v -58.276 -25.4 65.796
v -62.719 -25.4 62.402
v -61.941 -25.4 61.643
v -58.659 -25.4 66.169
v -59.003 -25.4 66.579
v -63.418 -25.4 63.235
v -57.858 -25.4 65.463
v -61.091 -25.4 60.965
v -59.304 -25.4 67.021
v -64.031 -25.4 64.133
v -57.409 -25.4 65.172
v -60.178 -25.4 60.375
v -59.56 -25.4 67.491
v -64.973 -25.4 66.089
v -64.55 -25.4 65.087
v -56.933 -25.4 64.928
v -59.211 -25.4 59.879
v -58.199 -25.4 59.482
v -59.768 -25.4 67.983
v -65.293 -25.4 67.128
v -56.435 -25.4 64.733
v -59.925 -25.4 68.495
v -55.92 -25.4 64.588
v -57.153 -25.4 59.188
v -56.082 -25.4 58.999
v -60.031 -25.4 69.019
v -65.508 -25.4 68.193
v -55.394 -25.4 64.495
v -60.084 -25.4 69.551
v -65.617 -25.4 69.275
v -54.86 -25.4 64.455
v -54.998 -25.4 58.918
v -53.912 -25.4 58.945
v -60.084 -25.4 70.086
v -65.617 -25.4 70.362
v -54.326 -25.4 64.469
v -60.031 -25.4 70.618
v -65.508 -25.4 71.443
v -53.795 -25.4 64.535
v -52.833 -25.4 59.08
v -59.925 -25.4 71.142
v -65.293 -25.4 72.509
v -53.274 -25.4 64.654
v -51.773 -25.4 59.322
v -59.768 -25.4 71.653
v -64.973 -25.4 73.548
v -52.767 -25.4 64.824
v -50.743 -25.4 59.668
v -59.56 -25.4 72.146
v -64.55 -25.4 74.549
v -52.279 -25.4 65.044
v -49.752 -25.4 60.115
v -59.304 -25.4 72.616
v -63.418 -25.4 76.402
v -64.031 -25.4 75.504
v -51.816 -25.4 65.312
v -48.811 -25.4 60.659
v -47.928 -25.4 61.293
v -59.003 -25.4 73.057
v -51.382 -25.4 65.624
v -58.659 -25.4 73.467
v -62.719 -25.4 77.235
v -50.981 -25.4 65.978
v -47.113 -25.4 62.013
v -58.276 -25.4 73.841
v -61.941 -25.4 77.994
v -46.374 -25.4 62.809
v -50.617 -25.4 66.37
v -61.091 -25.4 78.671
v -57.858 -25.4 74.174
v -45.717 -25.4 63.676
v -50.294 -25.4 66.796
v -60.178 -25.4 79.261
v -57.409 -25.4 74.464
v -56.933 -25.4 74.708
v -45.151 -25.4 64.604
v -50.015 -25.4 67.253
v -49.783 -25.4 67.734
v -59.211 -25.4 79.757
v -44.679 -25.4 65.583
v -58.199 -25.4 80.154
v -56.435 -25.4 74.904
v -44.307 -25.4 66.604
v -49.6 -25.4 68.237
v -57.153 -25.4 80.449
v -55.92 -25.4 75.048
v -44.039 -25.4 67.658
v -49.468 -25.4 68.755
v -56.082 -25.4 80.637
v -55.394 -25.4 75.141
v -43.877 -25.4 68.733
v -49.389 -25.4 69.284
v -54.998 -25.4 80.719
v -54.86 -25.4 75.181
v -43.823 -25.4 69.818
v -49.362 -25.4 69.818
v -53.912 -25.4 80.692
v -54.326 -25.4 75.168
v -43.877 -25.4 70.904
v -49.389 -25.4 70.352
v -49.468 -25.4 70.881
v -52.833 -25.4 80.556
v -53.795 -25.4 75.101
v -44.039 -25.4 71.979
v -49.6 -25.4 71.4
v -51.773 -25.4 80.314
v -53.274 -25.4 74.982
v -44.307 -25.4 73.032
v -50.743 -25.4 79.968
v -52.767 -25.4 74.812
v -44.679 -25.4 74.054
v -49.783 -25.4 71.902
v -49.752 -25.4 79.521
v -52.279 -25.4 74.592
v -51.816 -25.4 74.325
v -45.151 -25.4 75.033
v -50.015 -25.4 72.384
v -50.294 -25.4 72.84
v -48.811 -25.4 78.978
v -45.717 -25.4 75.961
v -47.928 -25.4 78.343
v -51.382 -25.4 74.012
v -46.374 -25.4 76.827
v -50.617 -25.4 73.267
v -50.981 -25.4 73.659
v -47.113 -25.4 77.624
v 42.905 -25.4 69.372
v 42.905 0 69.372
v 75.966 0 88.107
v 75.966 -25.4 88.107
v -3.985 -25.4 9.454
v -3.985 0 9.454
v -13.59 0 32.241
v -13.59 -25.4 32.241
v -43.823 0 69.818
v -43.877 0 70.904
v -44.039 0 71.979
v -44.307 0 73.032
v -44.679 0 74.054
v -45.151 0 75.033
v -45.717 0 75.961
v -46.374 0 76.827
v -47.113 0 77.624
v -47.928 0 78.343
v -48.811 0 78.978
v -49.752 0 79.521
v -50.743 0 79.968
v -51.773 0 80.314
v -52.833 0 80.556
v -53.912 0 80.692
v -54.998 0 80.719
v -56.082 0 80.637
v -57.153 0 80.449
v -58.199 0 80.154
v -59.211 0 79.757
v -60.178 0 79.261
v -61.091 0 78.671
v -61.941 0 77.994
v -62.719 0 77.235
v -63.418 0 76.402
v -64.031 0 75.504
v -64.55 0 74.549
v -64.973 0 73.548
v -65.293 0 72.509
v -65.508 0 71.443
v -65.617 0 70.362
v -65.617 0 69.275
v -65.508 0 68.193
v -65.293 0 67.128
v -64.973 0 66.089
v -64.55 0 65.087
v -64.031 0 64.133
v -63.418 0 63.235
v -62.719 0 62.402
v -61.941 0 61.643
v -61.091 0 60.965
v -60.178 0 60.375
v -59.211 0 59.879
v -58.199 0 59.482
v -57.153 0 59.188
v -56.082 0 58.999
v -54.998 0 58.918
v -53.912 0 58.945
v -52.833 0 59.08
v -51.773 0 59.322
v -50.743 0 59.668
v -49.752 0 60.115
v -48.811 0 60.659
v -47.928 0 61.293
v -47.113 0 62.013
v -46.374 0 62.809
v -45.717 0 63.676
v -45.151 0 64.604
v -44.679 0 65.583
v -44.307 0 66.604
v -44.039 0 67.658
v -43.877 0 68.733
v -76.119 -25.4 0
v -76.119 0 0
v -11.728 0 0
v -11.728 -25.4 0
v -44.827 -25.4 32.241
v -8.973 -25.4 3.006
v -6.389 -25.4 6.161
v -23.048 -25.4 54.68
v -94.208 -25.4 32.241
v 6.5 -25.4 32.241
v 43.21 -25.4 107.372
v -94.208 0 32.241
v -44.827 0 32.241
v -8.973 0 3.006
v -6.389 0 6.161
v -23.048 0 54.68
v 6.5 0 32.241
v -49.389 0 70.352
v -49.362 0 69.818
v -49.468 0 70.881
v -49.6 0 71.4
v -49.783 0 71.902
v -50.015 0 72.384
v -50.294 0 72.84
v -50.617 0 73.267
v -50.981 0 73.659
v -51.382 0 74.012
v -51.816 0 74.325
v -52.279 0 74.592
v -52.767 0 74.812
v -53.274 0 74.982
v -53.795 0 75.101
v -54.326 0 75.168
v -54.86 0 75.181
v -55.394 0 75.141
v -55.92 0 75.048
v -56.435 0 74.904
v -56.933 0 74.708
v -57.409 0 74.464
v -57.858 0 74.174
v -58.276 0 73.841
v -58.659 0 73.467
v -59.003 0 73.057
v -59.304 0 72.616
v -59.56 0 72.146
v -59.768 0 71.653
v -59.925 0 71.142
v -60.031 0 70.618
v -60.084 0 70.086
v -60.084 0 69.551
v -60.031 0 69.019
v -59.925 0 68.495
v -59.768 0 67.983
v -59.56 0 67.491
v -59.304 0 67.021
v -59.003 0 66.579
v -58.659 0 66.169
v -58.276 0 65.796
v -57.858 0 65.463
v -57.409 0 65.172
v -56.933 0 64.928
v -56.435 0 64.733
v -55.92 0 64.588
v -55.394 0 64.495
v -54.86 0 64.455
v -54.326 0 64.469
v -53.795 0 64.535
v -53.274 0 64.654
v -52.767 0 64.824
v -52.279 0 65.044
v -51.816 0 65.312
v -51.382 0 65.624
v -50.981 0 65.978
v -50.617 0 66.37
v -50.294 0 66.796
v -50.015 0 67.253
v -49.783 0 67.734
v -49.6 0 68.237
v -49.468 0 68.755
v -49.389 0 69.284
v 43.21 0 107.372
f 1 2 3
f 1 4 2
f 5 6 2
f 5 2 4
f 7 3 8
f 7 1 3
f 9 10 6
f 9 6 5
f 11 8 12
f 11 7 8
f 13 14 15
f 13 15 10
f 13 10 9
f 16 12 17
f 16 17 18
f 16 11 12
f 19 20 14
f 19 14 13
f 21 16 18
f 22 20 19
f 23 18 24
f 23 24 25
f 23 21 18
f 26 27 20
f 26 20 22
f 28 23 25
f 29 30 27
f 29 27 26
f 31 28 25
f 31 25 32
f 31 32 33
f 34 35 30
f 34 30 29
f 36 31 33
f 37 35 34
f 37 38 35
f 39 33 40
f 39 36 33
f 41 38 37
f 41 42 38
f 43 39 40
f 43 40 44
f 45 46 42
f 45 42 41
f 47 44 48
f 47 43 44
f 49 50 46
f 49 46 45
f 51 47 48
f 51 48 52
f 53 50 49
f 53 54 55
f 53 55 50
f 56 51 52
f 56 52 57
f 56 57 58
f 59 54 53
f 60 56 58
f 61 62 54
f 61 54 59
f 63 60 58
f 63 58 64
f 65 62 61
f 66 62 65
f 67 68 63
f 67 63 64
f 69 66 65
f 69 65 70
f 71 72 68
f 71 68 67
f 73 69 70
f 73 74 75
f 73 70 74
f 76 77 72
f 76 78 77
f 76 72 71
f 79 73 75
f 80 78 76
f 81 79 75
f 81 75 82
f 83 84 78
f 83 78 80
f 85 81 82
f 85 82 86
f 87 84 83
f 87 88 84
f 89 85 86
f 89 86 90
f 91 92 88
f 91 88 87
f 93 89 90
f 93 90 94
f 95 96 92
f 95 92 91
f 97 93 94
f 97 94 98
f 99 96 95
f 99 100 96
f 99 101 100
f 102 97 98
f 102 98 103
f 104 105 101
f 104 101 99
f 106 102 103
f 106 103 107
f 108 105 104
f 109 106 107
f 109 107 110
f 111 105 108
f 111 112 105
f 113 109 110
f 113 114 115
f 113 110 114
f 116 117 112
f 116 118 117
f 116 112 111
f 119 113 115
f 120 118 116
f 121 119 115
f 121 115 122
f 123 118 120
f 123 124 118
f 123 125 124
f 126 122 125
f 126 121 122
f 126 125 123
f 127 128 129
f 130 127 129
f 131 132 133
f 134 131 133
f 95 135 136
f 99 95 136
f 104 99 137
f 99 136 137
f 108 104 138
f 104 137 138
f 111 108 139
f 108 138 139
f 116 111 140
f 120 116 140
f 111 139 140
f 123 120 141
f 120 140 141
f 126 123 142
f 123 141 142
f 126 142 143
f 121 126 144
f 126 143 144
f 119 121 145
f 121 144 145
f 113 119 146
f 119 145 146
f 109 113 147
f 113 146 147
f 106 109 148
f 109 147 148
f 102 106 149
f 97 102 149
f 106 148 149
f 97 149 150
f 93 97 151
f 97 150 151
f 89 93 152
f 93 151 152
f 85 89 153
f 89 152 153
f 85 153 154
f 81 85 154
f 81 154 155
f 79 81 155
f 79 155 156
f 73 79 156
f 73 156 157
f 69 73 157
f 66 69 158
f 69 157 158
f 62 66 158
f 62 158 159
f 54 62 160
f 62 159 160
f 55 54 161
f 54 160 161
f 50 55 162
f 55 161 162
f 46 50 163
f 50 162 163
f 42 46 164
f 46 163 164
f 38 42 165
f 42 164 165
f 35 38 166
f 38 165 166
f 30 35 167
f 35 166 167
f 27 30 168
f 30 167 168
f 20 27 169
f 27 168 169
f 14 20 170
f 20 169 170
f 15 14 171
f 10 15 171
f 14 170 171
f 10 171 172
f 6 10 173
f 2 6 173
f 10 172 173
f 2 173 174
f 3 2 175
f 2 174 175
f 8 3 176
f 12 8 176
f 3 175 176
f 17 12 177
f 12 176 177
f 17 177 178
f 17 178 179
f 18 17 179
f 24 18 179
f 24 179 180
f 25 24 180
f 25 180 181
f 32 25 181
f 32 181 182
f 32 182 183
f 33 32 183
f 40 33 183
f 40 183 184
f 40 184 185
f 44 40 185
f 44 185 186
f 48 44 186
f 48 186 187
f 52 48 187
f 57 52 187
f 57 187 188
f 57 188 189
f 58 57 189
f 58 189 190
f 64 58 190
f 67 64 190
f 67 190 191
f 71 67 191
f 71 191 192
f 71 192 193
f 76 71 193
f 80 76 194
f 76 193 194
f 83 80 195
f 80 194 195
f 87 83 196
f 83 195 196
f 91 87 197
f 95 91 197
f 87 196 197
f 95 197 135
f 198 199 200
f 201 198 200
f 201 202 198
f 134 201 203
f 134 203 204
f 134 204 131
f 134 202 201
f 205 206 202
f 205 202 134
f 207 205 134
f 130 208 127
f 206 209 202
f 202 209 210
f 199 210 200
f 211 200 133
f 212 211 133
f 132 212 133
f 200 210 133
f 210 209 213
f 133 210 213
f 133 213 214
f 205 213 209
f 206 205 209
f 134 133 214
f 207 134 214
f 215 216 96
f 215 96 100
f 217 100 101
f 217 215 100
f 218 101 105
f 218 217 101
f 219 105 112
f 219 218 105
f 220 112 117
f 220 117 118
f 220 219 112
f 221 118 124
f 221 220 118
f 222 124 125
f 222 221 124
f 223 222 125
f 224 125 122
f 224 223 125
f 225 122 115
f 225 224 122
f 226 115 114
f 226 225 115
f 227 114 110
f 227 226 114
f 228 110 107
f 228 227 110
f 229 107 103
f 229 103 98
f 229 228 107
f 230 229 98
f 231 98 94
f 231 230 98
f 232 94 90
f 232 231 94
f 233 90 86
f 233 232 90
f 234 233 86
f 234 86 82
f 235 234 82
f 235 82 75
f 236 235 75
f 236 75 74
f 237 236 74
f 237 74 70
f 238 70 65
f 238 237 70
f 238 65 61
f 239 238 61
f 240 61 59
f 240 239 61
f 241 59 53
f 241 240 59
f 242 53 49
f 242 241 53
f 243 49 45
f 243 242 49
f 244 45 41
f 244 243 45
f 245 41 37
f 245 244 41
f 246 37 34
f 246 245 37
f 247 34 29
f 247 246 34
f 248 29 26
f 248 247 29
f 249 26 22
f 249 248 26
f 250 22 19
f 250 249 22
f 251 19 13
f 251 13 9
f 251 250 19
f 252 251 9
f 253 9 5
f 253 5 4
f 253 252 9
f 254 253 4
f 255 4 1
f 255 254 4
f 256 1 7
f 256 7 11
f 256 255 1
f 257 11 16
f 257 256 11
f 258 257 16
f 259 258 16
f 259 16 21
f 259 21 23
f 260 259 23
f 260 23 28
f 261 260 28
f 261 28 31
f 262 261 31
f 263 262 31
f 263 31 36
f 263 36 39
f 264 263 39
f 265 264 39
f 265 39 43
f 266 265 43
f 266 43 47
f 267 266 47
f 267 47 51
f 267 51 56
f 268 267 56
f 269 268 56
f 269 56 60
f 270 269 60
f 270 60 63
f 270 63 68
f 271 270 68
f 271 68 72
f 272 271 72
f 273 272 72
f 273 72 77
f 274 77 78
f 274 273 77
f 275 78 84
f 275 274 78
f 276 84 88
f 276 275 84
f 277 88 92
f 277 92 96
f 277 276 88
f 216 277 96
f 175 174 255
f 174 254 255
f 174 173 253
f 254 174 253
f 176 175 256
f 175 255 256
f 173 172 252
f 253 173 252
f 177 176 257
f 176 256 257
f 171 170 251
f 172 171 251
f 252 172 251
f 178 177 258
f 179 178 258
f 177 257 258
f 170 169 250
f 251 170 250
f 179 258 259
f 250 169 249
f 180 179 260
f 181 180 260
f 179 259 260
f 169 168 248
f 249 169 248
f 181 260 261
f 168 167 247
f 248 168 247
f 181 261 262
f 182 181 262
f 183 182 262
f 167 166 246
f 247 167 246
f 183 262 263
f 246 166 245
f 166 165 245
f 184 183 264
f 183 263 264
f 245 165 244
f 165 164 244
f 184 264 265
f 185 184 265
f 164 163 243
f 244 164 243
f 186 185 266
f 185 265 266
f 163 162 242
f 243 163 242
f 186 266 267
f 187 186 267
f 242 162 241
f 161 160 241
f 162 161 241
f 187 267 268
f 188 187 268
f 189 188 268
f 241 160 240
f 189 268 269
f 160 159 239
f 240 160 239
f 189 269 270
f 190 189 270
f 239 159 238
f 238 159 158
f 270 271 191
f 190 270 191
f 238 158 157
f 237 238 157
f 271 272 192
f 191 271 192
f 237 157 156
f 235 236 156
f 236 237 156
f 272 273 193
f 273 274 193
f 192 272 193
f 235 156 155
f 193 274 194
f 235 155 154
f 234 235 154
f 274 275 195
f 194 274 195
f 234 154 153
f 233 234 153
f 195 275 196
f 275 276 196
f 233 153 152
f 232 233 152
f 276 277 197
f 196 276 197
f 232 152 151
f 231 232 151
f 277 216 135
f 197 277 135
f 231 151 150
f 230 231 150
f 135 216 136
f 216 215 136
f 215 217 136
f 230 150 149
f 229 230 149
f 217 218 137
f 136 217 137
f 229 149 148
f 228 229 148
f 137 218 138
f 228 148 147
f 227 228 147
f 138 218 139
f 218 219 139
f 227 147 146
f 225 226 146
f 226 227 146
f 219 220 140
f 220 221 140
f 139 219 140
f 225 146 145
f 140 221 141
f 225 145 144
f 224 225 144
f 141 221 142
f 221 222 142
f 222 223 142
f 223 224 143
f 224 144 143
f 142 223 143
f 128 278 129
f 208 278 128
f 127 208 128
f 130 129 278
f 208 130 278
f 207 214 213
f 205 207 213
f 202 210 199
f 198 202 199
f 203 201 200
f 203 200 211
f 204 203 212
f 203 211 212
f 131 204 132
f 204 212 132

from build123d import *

# Parameters (mm, degrees)
F0_R     = 10.903736
F0_R_2   = 5.364604
F1_DEPTH = 25.4


with BuildPart() as f1:
    # F0 (on Front) → F1 (new body)
    with BuildSketch(Plane.XZ):
        Polygon((-44.827344, 32.240514), (-23.048093, 54.680253), (-94.208166, 32.240514), align=None)
        with BuildLine():
            Line((-13.589593, 32.240514), (-44.827344, 32.240514))
            Line((-44.827344, 32.240514), (-76.118895, 0))
            Line((-76.118895, 0), (-11.728096, 0))
            ThreePointArc((-11.728096, 0), (-7.659355, 4.565366), (-3.984738, 9.453557))
            Line((-3.984738, 9.453557), (-13.589593, 32.240514))
        make_face()
        Polygon((6.5002, 32.240514), (-23.048093, 54.680253), (-44.827344, 32.240514), (-13.589593, 32.240514), align=None)
        with Locations((-54.726478, 69.818258)):
            Circle(F0_R)
        with Locations((-54.726478, 69.818258)):
            Circle(F0_R_2, mode=Mode.SUBTRACT)
        Polygon((42.904512, 69.372174), (75.96644, 88.107262), (43.210413, 107.372187), align=None)
    extrude(amount=F1_DEPTH)


solid = f1.part
